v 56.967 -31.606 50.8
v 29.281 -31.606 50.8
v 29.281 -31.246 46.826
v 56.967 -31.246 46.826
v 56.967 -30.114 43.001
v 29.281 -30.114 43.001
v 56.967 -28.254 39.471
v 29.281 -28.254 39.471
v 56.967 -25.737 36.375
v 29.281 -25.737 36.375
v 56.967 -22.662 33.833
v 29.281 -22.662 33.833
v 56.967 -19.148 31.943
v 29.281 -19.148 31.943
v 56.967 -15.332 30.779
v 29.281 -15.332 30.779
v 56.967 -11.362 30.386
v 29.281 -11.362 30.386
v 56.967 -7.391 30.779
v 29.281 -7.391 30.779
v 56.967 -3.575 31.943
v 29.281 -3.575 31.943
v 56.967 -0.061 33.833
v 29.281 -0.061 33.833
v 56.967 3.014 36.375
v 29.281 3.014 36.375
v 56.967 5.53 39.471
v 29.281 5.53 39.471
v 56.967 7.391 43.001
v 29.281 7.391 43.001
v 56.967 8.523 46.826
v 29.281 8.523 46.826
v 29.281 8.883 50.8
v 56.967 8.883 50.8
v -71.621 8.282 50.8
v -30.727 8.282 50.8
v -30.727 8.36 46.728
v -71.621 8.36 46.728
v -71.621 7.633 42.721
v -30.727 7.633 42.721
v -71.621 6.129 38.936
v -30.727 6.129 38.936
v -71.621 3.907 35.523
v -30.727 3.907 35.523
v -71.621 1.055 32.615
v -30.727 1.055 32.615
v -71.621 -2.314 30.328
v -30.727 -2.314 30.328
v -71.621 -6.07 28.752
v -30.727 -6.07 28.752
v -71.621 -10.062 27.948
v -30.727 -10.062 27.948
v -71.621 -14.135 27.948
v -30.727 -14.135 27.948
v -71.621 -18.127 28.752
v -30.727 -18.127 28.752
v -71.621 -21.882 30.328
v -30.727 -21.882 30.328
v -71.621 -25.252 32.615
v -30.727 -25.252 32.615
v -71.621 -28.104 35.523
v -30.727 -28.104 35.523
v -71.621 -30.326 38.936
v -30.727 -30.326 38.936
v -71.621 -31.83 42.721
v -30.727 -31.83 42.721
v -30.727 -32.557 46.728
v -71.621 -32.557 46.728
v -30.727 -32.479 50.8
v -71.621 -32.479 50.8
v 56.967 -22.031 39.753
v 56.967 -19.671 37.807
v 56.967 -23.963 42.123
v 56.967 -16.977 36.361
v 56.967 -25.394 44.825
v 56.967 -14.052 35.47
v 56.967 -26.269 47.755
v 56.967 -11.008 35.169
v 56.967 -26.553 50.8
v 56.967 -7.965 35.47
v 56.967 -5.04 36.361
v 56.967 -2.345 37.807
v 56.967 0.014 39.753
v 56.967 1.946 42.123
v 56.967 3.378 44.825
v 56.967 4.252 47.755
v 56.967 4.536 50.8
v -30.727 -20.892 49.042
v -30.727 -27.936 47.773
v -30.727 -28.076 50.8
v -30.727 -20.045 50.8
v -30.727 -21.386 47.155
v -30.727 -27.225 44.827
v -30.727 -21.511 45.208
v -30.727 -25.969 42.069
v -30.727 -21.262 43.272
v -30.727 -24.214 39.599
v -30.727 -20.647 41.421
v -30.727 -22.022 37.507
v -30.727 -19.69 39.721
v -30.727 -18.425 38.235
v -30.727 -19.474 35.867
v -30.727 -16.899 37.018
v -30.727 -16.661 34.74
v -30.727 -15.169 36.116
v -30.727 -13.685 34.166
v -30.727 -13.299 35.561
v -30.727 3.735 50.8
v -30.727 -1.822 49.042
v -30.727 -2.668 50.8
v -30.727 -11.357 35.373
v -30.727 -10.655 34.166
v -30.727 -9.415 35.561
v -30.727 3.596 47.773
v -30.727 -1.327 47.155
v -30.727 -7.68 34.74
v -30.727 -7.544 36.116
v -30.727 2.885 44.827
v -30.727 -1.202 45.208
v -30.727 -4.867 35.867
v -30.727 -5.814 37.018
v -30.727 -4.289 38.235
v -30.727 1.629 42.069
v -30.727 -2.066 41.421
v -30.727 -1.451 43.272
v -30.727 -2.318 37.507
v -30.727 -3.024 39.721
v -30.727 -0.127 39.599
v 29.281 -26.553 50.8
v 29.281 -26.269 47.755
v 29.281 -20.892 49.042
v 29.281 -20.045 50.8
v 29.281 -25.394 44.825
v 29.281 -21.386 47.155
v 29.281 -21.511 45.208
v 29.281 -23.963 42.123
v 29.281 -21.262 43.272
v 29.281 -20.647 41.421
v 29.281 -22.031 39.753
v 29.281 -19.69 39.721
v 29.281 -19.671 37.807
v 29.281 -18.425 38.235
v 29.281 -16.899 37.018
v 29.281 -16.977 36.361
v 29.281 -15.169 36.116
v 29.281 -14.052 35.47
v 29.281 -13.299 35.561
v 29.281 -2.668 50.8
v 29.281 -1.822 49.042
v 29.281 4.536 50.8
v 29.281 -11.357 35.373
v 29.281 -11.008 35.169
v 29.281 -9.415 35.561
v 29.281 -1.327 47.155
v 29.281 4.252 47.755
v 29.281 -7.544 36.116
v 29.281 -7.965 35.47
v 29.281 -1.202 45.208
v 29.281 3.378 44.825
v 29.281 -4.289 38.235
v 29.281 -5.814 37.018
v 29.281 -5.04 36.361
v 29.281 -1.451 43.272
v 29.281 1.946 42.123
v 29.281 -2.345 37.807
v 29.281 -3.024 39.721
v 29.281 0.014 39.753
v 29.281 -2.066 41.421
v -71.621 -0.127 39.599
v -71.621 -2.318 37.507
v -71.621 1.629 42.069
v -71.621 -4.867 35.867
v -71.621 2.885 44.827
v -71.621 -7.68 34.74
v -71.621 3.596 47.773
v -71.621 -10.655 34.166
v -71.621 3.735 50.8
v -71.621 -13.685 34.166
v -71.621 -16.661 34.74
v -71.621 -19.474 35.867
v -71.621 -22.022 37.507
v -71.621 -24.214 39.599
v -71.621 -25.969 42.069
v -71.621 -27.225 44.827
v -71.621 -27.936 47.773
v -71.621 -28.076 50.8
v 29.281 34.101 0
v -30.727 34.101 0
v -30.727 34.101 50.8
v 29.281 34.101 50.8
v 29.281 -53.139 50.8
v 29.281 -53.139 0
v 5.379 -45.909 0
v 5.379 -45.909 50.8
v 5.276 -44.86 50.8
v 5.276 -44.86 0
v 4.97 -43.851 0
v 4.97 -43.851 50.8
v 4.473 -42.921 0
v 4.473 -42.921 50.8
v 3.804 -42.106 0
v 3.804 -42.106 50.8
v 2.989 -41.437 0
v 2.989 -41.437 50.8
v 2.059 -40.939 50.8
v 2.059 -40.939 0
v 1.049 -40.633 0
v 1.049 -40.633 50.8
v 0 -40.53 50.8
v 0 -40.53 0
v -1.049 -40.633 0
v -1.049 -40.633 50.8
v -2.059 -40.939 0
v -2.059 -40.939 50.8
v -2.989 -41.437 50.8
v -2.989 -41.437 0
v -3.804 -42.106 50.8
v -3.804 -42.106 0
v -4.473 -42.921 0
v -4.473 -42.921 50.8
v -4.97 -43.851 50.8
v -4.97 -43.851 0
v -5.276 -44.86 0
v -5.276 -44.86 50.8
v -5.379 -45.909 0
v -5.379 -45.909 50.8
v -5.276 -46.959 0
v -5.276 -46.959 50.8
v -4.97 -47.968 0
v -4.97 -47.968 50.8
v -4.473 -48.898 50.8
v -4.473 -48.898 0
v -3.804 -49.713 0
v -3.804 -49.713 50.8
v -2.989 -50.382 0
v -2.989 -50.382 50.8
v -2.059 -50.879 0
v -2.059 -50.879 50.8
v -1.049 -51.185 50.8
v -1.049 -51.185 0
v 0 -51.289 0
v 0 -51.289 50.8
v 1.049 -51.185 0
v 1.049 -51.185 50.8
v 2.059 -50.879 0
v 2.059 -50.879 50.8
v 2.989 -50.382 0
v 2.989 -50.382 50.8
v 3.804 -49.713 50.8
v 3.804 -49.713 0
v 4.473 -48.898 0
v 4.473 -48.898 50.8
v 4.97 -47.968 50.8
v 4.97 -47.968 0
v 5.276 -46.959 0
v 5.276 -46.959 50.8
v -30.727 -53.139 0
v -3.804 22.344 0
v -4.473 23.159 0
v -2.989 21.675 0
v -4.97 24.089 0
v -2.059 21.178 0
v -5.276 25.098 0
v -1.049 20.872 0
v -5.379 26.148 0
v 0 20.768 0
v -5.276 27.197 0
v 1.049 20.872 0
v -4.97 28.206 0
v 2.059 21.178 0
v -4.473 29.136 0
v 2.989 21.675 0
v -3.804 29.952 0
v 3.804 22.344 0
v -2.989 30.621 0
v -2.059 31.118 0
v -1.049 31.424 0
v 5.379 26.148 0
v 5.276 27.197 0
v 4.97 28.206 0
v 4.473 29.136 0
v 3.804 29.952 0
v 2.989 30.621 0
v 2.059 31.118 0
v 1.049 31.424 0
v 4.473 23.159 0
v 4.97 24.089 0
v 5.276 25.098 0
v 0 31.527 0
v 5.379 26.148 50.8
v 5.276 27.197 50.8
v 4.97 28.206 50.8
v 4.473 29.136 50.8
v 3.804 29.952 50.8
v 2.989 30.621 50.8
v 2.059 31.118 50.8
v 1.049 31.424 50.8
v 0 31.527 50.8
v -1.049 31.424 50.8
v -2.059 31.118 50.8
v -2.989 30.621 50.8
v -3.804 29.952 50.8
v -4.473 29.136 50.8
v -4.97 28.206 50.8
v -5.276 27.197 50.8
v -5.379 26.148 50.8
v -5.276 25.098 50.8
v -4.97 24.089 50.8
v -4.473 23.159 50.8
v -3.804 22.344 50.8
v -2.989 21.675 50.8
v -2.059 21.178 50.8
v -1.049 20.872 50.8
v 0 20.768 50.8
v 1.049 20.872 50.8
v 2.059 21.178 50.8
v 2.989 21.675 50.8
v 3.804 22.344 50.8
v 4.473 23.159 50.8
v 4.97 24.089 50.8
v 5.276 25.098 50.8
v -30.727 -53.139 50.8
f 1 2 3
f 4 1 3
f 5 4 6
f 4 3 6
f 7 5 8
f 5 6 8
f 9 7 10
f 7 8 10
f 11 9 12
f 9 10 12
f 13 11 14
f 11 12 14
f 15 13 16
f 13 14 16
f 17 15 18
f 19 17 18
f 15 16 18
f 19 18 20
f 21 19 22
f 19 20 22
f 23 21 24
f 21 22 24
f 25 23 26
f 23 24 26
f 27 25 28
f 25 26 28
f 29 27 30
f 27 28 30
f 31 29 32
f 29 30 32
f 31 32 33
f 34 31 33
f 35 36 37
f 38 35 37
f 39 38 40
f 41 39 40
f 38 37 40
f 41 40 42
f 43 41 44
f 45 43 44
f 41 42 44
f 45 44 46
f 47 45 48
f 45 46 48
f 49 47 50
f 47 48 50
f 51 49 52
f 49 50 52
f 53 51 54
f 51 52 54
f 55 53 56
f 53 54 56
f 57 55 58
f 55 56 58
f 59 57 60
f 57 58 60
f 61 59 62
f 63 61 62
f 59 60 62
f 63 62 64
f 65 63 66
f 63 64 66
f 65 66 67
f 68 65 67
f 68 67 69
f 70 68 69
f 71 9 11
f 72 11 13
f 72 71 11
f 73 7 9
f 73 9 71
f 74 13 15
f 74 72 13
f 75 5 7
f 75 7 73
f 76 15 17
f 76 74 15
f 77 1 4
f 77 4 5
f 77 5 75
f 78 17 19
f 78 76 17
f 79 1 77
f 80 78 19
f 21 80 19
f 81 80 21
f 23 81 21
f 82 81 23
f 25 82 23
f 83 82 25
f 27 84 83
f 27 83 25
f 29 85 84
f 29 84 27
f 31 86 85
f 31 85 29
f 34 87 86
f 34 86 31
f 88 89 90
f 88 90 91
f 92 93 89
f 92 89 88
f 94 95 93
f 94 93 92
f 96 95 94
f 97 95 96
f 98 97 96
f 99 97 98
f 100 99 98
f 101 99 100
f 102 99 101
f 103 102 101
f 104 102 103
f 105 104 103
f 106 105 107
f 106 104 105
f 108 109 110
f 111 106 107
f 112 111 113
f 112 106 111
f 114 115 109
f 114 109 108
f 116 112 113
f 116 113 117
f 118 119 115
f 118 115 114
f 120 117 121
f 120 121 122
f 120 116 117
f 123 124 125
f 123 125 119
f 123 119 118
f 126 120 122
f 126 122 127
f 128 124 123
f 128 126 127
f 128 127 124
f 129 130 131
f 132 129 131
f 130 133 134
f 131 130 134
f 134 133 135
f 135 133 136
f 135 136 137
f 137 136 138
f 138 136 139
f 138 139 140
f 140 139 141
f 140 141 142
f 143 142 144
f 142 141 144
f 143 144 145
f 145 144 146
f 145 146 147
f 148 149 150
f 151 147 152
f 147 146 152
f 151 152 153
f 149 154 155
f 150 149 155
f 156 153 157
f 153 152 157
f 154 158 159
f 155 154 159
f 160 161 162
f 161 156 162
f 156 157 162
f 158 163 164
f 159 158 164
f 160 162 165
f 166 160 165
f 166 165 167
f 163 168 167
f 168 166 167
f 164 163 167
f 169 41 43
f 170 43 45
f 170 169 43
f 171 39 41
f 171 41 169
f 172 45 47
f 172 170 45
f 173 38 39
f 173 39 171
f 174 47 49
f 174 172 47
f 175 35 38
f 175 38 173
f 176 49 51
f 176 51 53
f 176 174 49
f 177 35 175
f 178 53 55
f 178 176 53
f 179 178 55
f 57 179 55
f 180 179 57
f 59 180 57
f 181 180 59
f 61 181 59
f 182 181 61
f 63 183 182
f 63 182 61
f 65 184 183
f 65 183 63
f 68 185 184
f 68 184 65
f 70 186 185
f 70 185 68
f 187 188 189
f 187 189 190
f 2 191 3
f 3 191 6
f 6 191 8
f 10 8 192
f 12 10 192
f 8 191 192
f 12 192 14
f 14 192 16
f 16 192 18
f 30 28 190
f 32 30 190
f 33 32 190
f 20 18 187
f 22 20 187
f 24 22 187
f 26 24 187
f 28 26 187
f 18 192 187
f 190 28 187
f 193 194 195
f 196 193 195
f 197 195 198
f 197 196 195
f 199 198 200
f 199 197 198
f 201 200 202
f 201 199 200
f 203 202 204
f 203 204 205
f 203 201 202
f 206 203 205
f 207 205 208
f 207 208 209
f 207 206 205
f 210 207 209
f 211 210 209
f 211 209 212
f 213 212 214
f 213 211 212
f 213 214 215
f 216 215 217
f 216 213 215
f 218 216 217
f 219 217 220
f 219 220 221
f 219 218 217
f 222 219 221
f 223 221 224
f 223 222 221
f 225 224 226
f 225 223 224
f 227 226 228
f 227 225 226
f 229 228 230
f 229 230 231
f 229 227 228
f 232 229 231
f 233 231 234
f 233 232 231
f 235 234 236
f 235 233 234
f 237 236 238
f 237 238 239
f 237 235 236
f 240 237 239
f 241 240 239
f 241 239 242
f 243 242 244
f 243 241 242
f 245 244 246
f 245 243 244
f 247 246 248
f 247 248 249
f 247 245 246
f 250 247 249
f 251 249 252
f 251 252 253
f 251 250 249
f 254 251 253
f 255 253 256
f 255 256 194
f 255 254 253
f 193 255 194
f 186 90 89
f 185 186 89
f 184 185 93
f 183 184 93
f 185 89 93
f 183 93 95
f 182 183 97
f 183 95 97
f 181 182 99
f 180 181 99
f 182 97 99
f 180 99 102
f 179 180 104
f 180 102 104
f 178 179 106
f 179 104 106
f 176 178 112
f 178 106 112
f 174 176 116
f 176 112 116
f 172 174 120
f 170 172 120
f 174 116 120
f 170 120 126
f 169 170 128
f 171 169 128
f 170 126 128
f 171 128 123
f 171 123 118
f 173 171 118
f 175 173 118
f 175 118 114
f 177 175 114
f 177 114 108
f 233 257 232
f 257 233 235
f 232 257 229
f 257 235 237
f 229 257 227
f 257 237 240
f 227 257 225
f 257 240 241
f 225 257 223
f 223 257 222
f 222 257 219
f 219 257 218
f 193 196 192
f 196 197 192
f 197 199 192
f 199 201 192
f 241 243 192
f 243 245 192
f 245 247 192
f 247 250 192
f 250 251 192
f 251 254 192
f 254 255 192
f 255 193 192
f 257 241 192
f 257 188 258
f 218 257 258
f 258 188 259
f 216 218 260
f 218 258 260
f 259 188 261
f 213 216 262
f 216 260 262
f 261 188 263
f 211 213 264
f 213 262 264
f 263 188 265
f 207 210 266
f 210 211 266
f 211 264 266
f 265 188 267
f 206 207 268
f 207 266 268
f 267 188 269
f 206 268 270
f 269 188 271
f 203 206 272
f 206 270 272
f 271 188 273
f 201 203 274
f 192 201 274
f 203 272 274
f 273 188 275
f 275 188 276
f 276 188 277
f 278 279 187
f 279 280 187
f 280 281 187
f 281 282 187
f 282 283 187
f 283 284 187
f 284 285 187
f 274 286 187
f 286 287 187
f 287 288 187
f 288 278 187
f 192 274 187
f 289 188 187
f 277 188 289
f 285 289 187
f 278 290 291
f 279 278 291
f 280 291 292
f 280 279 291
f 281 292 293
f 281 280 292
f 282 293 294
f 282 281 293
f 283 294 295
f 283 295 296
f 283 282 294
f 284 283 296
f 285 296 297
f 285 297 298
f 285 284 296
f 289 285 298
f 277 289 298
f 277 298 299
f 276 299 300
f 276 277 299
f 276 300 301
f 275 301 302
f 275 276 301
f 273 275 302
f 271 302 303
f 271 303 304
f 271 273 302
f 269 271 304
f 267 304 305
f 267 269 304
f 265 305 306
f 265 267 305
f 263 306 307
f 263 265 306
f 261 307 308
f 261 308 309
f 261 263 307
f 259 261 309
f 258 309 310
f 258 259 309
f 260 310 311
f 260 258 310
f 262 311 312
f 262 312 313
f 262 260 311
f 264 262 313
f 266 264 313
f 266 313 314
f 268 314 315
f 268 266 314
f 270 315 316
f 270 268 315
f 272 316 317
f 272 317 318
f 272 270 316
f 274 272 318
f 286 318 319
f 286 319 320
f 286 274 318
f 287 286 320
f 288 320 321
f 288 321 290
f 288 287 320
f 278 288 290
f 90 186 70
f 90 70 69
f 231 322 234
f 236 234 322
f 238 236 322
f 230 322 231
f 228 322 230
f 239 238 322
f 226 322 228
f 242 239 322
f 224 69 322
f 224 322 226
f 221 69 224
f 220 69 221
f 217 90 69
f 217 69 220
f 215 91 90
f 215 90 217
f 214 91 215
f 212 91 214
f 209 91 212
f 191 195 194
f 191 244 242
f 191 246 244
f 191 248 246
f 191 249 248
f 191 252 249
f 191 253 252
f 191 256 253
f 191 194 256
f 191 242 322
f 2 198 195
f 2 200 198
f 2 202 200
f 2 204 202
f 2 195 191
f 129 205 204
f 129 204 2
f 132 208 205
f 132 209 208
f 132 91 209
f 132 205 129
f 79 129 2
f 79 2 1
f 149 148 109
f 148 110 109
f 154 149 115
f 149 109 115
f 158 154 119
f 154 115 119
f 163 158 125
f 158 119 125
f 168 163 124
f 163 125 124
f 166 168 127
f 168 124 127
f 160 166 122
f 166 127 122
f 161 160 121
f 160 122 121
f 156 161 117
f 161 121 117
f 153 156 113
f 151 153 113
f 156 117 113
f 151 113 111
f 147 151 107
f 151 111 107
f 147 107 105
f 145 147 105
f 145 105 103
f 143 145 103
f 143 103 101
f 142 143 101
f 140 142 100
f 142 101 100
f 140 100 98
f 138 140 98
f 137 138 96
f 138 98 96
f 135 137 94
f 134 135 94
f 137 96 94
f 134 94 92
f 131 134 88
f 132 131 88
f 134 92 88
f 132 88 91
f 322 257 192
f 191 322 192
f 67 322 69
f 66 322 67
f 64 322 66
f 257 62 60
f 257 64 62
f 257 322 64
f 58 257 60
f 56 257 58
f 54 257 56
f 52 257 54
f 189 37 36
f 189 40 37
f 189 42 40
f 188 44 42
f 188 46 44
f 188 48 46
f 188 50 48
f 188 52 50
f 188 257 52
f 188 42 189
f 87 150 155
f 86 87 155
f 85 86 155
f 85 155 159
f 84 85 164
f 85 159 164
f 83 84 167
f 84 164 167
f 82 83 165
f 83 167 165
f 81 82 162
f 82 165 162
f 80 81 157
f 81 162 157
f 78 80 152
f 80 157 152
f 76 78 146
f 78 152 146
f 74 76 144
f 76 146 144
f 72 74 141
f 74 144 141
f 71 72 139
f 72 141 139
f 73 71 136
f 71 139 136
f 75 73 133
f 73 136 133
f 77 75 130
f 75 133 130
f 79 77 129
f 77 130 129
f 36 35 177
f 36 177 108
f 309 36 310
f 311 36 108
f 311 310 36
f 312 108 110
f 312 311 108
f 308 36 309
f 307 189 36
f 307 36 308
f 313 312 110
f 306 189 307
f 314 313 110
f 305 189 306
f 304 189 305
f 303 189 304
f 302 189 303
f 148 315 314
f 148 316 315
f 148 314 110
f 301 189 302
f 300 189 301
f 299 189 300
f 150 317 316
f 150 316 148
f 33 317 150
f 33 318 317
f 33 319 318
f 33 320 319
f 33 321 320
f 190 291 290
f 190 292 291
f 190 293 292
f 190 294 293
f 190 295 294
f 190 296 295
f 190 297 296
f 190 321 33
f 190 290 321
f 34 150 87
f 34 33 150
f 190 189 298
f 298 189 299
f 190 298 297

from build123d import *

# Parameters (mm, degrees)
F0_W     = 60.007502
F0_H     = 87.23982
F0_R     = 5.379351
F1_DEPTH = 50.8
F3_DEPTH = 40.894
F5_DEPTH = 27.686
F6_D     = 20.32


with BuildPart() as f1:
    # F0 (on Top) → F1 (new body)
    with BuildSketch(Plane.XY):
        with Locations((-0.722982, -9.519262)):
            Rectangle(F0_W, F0_H)
        with Locations((0, -45.909356)):
            Circle(F0_R, mode=Mode.SUBTRACT)
        with Locations((0, 26.147846)):
            Circle(F0_R, mode=Mode.SUBTRACT)
    extrude(amount=F1_DEPTH)

    # F2 (on face) → F3 (join)
    with BuildSketch(Plane(origin=(-30.726733, 0, 0), x_dir=(0, -1, 0), z_dir=(-1, 0, 0))):
        with BuildLine():
            ThreePointArc((28.075797, 50.8), (12.170195, 34.093327), (-3.735408, 50.8))
            Line((-3.735408, 50.8), (-8.281821, 50.8))
            ThreePointArc((-8.281821, 50.8), (12.098354, 27.846321), (32.47853, 50.8))
            Line((32.47853, 50.8), (28.075797, 50.8))
        make_face()
    extrude(amount=F3_DEPTH)

    # F4 (on face) → F5 (join)
    with BuildSketch(Plane.YZ.offset(29.280769)):
        with BuildLine():
            Line((-26.553022, 50.8), (-31.606492, 50.8))
            ThreePointArc((-31.606492, 50.8), (-11.361636, 30.385585), (8.88322, 50.8))
            Line((8.88322, 50.8), (4.536318, 50.8))
            ThreePointArc((4.536318, 50.8), (-11.008352, 35.169395), (-26.553022, 50.8))
        make_face()
    extrude(amount=F5_DEPTH)

    # F6 (through all)
    with Locations(Plane.YZ.offset(29.280769)):
        with Locations((-11.356696, 45.533322)):
            Hole(F6_D / 2)


solid = f1.part
